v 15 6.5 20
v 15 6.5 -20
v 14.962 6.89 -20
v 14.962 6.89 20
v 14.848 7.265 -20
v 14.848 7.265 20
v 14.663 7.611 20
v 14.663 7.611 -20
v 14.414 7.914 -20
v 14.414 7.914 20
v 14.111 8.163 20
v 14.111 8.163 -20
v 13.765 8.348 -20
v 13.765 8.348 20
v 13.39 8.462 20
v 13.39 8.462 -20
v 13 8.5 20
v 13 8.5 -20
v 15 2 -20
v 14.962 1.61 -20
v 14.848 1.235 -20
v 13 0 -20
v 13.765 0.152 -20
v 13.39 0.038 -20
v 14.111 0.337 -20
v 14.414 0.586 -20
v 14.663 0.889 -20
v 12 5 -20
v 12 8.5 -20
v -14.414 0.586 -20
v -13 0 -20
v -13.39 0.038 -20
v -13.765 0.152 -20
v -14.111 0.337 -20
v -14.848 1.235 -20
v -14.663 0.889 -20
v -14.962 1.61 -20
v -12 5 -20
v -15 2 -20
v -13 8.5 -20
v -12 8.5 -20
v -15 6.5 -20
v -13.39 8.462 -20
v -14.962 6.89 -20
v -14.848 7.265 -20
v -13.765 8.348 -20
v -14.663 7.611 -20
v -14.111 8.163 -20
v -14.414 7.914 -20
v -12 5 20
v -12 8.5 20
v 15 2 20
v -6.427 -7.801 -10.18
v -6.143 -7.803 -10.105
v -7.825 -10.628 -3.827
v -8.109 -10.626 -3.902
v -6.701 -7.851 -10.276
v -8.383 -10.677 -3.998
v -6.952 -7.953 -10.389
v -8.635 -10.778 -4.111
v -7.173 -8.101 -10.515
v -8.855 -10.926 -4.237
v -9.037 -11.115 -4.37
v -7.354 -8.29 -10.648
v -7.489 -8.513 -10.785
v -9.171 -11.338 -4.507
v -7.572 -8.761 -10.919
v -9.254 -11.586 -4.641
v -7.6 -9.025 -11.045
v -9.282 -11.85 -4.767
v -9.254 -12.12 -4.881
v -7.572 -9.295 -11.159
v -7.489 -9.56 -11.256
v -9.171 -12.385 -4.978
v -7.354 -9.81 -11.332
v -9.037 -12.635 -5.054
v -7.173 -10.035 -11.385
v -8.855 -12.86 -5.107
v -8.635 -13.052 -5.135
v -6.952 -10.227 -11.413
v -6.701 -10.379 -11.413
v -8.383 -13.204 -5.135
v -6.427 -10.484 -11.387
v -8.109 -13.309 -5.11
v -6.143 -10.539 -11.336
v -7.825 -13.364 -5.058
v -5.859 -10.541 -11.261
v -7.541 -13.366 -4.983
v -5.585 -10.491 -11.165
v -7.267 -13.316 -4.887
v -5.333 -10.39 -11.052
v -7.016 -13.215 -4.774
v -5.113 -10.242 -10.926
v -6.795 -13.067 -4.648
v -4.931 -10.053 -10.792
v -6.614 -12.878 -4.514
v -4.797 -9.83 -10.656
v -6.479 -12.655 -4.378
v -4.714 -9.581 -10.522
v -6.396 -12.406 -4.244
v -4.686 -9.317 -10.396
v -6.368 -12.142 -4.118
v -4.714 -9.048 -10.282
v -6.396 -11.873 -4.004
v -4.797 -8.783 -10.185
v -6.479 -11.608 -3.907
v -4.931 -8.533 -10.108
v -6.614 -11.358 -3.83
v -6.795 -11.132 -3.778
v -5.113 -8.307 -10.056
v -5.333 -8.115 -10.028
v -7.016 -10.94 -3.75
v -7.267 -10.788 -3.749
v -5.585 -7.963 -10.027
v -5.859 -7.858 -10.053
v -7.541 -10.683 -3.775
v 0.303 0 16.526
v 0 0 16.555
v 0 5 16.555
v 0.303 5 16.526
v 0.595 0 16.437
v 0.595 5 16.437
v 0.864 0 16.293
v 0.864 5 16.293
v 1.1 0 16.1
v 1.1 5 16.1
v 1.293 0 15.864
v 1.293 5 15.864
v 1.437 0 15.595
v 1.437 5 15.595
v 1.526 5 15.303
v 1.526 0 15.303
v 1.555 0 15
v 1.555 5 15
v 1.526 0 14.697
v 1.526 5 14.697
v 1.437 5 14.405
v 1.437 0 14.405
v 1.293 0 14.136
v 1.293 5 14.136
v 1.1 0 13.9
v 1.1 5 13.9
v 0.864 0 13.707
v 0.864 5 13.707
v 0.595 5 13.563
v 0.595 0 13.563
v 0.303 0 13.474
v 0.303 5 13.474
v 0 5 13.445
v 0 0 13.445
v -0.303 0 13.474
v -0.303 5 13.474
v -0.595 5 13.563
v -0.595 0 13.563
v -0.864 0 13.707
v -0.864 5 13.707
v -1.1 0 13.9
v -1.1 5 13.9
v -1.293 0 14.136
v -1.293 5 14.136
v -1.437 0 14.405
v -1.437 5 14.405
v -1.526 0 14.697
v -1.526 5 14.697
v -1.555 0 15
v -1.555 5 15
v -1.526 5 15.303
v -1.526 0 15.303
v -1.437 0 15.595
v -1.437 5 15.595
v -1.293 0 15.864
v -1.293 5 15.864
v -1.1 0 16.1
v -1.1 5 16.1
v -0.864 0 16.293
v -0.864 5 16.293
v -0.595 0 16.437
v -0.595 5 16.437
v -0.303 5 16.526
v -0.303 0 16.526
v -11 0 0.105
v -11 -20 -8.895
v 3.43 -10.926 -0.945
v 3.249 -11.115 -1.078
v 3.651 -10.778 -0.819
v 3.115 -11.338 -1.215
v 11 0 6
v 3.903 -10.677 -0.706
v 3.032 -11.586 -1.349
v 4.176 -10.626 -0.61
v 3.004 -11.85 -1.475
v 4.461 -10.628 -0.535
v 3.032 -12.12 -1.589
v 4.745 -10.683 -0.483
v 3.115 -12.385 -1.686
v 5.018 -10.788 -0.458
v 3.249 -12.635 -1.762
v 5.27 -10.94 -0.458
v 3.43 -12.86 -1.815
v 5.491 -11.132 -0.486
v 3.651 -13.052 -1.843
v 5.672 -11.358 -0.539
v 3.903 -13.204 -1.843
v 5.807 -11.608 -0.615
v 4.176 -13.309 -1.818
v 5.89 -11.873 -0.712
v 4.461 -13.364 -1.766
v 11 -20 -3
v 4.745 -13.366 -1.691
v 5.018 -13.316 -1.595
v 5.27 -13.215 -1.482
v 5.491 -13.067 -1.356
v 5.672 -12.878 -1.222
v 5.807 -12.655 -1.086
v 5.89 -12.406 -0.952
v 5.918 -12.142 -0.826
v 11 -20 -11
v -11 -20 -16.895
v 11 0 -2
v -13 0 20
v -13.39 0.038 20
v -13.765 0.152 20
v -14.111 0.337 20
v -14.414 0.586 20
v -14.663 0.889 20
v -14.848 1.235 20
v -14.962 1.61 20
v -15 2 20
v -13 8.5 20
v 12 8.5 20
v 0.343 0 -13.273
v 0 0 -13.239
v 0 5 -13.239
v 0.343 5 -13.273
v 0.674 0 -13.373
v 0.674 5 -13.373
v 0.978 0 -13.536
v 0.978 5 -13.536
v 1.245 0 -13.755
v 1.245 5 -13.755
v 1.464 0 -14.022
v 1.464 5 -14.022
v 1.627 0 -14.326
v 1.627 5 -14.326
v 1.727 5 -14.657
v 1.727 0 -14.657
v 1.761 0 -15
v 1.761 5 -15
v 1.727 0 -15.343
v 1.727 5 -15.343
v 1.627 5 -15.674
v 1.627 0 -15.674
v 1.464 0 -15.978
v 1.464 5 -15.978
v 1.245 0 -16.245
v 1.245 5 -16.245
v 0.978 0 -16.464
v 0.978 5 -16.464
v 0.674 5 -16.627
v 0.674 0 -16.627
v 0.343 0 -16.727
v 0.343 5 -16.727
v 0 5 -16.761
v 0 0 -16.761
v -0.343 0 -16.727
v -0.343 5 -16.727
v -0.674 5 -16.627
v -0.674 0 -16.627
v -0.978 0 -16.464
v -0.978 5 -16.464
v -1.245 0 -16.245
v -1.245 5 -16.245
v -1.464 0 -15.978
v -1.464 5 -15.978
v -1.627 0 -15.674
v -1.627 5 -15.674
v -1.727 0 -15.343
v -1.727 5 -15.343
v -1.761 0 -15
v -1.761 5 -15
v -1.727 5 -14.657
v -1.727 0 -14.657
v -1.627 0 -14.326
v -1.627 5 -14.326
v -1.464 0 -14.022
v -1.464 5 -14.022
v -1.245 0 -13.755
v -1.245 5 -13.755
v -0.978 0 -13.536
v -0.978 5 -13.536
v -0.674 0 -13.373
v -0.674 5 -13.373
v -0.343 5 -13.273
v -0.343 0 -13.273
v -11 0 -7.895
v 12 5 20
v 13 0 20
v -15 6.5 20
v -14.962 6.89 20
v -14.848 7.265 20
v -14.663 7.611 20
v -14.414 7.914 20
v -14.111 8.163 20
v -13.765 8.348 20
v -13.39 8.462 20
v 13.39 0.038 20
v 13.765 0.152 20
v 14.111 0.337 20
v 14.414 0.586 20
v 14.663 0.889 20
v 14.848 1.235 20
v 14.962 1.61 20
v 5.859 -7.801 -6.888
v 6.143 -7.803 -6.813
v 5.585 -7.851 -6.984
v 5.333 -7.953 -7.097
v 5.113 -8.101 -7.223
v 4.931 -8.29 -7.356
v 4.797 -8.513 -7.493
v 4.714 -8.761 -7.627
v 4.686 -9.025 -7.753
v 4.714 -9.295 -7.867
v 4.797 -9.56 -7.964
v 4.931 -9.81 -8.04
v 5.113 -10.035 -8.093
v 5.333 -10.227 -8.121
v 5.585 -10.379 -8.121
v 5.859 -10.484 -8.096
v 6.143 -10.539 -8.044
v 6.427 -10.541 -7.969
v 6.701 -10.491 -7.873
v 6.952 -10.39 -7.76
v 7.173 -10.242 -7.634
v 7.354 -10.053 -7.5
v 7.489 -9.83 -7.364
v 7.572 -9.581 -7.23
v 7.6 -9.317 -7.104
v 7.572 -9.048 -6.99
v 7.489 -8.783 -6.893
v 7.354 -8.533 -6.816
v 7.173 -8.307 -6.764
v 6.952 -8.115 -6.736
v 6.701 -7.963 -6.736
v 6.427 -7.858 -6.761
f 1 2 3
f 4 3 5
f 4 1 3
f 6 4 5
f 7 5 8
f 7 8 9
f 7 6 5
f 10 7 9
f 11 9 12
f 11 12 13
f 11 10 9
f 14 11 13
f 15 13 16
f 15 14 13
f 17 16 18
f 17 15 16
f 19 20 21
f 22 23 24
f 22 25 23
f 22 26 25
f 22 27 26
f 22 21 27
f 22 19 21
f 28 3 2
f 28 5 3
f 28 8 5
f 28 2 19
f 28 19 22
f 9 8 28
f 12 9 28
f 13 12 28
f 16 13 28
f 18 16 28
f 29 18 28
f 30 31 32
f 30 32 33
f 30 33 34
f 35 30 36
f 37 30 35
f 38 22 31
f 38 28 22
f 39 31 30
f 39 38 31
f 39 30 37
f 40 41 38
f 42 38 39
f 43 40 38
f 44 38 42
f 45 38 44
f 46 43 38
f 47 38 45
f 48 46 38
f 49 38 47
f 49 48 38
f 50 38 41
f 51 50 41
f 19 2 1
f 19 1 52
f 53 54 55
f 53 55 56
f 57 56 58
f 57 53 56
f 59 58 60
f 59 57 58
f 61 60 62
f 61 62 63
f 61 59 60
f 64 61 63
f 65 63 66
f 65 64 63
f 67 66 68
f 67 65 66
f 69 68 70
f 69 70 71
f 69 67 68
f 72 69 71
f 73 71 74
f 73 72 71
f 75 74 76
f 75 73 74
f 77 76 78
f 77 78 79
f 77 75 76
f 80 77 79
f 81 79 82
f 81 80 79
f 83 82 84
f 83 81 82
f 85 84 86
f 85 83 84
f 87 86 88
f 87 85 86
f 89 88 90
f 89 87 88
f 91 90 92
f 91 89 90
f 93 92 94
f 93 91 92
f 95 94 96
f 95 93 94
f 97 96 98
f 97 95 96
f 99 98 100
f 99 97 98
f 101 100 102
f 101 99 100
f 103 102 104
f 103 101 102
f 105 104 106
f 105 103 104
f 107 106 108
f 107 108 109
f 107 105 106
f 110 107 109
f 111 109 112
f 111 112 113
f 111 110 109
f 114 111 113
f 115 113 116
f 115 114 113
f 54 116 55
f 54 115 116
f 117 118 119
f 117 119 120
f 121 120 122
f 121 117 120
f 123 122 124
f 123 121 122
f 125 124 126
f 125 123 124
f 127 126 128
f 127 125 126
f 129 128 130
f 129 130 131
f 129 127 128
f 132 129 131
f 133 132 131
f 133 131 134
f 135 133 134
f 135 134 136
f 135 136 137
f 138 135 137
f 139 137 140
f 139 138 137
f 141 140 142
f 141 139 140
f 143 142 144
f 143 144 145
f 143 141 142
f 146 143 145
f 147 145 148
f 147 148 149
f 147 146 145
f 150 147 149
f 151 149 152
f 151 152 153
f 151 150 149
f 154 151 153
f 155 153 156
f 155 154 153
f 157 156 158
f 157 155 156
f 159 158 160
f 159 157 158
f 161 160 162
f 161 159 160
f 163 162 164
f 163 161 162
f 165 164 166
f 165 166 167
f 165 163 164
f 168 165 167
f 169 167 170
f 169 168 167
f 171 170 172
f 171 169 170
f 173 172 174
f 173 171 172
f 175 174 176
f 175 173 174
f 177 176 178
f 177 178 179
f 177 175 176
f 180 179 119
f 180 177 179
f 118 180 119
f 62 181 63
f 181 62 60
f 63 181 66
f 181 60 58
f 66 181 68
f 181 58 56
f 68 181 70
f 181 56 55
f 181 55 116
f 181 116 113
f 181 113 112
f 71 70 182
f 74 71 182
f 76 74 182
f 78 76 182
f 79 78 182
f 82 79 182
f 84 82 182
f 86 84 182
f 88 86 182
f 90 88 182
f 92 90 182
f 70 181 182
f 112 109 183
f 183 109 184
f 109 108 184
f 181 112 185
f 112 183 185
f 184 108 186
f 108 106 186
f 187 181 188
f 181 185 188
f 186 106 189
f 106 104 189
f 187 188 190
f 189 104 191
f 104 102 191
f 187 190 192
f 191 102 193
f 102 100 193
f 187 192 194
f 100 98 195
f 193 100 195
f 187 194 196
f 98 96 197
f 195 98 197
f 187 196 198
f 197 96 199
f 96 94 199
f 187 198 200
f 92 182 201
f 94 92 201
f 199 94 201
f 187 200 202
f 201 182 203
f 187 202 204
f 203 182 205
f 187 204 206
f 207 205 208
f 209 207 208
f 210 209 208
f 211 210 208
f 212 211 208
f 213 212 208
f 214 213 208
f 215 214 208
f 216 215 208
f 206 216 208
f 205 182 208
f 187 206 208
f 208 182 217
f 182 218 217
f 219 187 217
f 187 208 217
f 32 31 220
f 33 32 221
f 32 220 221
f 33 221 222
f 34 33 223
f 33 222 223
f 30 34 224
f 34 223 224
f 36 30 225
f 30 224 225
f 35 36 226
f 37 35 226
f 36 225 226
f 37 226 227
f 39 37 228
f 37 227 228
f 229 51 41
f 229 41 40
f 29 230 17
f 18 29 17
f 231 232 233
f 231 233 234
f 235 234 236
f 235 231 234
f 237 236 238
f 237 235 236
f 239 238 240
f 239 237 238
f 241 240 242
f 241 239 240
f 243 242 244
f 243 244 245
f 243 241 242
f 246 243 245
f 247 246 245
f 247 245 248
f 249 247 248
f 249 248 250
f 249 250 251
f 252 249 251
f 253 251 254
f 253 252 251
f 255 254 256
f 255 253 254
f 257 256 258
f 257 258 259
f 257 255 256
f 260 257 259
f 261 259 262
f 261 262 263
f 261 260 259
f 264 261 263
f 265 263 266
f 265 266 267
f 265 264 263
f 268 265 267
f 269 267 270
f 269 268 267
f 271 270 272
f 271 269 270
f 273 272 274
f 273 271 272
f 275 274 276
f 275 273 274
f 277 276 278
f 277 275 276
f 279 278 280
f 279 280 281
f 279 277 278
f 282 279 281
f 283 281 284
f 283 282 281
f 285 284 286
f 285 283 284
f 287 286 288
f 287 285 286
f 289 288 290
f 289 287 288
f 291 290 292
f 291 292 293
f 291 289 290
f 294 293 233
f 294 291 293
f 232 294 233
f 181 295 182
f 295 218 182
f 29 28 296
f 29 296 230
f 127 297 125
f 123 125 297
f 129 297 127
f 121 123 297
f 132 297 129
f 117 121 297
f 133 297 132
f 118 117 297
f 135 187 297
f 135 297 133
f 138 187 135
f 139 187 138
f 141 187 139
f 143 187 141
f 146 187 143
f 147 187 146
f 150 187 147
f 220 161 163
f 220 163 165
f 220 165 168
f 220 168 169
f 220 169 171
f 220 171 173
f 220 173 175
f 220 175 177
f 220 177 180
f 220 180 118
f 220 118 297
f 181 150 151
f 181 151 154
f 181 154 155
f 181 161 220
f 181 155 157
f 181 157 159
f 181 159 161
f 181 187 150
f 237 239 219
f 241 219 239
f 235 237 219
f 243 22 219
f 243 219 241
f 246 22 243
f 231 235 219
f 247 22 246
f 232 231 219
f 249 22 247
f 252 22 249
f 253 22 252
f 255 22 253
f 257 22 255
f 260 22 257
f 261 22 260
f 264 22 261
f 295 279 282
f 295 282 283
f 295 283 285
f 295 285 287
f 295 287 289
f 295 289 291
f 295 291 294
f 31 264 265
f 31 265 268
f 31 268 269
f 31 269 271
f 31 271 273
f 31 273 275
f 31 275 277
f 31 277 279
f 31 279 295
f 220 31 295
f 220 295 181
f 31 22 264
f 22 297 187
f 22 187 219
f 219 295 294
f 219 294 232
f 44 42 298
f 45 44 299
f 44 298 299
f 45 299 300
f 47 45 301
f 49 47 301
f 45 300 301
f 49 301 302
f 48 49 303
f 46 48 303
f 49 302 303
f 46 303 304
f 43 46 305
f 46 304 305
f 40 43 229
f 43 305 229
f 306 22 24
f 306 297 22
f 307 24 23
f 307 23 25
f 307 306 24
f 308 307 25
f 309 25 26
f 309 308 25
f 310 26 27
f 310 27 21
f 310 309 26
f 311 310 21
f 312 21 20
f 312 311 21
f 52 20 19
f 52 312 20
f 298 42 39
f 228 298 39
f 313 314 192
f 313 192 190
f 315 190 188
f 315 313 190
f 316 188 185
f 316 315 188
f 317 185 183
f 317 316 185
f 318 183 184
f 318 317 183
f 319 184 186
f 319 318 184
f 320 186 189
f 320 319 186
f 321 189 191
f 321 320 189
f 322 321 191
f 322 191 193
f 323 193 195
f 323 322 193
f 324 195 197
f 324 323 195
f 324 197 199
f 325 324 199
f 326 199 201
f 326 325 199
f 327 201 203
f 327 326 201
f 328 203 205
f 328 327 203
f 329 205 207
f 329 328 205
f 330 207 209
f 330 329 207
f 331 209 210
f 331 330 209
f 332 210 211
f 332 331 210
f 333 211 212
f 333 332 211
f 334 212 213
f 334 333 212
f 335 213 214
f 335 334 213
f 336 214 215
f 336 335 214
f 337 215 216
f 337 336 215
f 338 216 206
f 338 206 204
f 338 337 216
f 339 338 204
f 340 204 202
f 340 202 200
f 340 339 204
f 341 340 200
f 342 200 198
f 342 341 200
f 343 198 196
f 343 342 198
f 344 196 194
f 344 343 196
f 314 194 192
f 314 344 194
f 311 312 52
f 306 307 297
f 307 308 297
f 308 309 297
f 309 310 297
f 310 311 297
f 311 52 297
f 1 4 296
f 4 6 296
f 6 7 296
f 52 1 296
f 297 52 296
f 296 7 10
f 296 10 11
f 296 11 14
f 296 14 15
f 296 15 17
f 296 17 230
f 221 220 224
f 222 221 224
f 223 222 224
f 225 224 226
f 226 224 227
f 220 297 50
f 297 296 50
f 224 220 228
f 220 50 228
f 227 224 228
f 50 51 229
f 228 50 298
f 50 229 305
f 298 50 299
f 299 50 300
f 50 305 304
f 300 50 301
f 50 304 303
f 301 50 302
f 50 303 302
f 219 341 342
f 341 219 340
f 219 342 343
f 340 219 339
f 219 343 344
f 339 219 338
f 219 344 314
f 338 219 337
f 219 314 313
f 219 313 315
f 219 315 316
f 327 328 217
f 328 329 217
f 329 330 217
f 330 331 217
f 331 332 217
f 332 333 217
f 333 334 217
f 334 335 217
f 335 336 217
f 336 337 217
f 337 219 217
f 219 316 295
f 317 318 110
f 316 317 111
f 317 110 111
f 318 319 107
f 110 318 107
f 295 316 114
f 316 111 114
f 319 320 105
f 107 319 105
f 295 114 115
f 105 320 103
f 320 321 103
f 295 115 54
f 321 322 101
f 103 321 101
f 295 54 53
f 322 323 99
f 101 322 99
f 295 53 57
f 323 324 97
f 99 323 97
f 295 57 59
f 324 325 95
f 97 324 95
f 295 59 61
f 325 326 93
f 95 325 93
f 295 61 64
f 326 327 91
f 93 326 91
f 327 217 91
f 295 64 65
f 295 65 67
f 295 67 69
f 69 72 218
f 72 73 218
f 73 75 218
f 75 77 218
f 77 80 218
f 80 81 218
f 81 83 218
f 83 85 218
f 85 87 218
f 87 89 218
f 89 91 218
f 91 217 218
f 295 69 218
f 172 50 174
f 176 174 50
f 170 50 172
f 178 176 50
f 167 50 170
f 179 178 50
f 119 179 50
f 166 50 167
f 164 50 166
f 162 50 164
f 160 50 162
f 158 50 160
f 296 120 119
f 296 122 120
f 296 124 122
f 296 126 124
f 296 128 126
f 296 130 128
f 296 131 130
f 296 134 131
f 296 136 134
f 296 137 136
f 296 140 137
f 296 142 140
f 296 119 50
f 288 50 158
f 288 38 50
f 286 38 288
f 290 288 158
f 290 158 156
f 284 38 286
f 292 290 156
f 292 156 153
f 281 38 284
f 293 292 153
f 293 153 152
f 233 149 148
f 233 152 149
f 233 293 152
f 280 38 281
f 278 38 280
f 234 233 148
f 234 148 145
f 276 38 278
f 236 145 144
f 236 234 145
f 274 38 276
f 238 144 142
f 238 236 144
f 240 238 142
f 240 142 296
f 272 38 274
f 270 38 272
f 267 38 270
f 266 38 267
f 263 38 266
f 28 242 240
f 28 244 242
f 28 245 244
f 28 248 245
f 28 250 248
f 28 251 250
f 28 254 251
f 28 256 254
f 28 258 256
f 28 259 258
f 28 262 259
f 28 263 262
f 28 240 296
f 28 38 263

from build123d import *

# Parameters (mm, degrees)
SKETCH1_W           = 22
SKETCH1_H           = 40
SKETCH1_R           = 1.760631049
SKETCH1_R_2         = 1.555398854
BOSS_EXTRUDE1_DEPTH = 5
BOSS_EXTRUDE3_DEPTH = 40
FILLET1_R           = 2
SKETCH6_R           = 1.5
CUT_EXTRUDE1_DEPTH  = 7.086873748


with BuildPart() as part:
    # Sketch1 → Boss-Extrude1 (new body)
    with BuildSketch(Plane(origin=(0, 0, 0), x_dir=(1, 0, 0), z_dir=(0, 1, 0))):
        Rectangle(SKETCH1_W, SKETCH1_H)
        with Locations(Location((0, 15, 0), (0, 0, 270))):
            Circle(SKETCH1_R, mode=Mode.SUBTRACT)
        with Locations(Location((0, -15, 0), (0, 0, 270))):
            Circle(SKETCH1_R_2, mode=Mode.SUBTRACT)
    extrude(amount=BOSS_EXTRUDE1_DEPTH)

    # Sketch4 → Boss-Extrude3 (add)
    with BuildSketch(Plane(origin=(0, 0, -20), x_dir=(-1, 0, 0), z_dir=(0, 0, -1))):
        Polygon((-11, 5), (-12, 5), (-12, 8.5), (-15, 8.5), (-15, 0), (-11, 0), align=None)
        Polygon((11, 0), (11, 5), (12, 5), (12, 8.5), (15, 8.5), (15, 0), align=None)
    extrude(amount=-BOSS_EXTRUDE3_DEPTH)

    # Fillet1
    fillet1_edges = [part.edges().sort_by_distance(p)[0] for p in [
        (15, 0, 0),
        (15, 8.5, 0),
        (-15, 0, 0),
        (-15, 8.5, 0),
    ]]
    fillet(fillet1_edges, radius=FILLET1_R)

    # Sketch2 → Loft1 section 0
    with BuildSketch(Plane.XZ):
        with BuildLine():
            Line((-11, 0.105117767), (11, 6))
            Line((11, 6), (11, -2))
            Line((11, -2), (-11, -7.894882233))
            Line((-11, -7.894882233), (-11, 0.105117767))
        make_face()
    # Sketch5 → Loft1 section 1
    with BuildSketch(Plane(origin=(0, -20, 0), x_dir=(-1, 0, 0), z_dir=(0, -1, 0))):
        with BuildLine():
            Line((-11, 3), (-11, 11))
            Line((-11, 11), (11, 16.894882233))
            Line((11, 16.894882233), (11, 8.894882233))
            Line((11, 8.894882233), (-11, 3))
        make_face()
    loft()

    # Sketch6 → Cut-Extrude1 (cut)
    with BuildSketch(Plane(origin=(1.040309356, 1.747119317, -3.882487372), x_dir=(0.9714204714250083, -0.09740631922929449, 0.21645848717621435), z_dir=(-0.2373652621939752, -0.3986366483069059, 0.8858592184598079))):
        with Locations(Location((5.252708211, -11.411685947, 0), (0, 0, 90))):
            Circle(SKETCH6_R)
        with Locations(Location((-7.39453945, -12.762593713, 0), (0, 0, 90))):
            Circle(SKETCH6_R)
    extrude(amount=CUT_EXTRUDE1_DEPTH, mode=Mode.SUBTRACT)


solid = part.part
